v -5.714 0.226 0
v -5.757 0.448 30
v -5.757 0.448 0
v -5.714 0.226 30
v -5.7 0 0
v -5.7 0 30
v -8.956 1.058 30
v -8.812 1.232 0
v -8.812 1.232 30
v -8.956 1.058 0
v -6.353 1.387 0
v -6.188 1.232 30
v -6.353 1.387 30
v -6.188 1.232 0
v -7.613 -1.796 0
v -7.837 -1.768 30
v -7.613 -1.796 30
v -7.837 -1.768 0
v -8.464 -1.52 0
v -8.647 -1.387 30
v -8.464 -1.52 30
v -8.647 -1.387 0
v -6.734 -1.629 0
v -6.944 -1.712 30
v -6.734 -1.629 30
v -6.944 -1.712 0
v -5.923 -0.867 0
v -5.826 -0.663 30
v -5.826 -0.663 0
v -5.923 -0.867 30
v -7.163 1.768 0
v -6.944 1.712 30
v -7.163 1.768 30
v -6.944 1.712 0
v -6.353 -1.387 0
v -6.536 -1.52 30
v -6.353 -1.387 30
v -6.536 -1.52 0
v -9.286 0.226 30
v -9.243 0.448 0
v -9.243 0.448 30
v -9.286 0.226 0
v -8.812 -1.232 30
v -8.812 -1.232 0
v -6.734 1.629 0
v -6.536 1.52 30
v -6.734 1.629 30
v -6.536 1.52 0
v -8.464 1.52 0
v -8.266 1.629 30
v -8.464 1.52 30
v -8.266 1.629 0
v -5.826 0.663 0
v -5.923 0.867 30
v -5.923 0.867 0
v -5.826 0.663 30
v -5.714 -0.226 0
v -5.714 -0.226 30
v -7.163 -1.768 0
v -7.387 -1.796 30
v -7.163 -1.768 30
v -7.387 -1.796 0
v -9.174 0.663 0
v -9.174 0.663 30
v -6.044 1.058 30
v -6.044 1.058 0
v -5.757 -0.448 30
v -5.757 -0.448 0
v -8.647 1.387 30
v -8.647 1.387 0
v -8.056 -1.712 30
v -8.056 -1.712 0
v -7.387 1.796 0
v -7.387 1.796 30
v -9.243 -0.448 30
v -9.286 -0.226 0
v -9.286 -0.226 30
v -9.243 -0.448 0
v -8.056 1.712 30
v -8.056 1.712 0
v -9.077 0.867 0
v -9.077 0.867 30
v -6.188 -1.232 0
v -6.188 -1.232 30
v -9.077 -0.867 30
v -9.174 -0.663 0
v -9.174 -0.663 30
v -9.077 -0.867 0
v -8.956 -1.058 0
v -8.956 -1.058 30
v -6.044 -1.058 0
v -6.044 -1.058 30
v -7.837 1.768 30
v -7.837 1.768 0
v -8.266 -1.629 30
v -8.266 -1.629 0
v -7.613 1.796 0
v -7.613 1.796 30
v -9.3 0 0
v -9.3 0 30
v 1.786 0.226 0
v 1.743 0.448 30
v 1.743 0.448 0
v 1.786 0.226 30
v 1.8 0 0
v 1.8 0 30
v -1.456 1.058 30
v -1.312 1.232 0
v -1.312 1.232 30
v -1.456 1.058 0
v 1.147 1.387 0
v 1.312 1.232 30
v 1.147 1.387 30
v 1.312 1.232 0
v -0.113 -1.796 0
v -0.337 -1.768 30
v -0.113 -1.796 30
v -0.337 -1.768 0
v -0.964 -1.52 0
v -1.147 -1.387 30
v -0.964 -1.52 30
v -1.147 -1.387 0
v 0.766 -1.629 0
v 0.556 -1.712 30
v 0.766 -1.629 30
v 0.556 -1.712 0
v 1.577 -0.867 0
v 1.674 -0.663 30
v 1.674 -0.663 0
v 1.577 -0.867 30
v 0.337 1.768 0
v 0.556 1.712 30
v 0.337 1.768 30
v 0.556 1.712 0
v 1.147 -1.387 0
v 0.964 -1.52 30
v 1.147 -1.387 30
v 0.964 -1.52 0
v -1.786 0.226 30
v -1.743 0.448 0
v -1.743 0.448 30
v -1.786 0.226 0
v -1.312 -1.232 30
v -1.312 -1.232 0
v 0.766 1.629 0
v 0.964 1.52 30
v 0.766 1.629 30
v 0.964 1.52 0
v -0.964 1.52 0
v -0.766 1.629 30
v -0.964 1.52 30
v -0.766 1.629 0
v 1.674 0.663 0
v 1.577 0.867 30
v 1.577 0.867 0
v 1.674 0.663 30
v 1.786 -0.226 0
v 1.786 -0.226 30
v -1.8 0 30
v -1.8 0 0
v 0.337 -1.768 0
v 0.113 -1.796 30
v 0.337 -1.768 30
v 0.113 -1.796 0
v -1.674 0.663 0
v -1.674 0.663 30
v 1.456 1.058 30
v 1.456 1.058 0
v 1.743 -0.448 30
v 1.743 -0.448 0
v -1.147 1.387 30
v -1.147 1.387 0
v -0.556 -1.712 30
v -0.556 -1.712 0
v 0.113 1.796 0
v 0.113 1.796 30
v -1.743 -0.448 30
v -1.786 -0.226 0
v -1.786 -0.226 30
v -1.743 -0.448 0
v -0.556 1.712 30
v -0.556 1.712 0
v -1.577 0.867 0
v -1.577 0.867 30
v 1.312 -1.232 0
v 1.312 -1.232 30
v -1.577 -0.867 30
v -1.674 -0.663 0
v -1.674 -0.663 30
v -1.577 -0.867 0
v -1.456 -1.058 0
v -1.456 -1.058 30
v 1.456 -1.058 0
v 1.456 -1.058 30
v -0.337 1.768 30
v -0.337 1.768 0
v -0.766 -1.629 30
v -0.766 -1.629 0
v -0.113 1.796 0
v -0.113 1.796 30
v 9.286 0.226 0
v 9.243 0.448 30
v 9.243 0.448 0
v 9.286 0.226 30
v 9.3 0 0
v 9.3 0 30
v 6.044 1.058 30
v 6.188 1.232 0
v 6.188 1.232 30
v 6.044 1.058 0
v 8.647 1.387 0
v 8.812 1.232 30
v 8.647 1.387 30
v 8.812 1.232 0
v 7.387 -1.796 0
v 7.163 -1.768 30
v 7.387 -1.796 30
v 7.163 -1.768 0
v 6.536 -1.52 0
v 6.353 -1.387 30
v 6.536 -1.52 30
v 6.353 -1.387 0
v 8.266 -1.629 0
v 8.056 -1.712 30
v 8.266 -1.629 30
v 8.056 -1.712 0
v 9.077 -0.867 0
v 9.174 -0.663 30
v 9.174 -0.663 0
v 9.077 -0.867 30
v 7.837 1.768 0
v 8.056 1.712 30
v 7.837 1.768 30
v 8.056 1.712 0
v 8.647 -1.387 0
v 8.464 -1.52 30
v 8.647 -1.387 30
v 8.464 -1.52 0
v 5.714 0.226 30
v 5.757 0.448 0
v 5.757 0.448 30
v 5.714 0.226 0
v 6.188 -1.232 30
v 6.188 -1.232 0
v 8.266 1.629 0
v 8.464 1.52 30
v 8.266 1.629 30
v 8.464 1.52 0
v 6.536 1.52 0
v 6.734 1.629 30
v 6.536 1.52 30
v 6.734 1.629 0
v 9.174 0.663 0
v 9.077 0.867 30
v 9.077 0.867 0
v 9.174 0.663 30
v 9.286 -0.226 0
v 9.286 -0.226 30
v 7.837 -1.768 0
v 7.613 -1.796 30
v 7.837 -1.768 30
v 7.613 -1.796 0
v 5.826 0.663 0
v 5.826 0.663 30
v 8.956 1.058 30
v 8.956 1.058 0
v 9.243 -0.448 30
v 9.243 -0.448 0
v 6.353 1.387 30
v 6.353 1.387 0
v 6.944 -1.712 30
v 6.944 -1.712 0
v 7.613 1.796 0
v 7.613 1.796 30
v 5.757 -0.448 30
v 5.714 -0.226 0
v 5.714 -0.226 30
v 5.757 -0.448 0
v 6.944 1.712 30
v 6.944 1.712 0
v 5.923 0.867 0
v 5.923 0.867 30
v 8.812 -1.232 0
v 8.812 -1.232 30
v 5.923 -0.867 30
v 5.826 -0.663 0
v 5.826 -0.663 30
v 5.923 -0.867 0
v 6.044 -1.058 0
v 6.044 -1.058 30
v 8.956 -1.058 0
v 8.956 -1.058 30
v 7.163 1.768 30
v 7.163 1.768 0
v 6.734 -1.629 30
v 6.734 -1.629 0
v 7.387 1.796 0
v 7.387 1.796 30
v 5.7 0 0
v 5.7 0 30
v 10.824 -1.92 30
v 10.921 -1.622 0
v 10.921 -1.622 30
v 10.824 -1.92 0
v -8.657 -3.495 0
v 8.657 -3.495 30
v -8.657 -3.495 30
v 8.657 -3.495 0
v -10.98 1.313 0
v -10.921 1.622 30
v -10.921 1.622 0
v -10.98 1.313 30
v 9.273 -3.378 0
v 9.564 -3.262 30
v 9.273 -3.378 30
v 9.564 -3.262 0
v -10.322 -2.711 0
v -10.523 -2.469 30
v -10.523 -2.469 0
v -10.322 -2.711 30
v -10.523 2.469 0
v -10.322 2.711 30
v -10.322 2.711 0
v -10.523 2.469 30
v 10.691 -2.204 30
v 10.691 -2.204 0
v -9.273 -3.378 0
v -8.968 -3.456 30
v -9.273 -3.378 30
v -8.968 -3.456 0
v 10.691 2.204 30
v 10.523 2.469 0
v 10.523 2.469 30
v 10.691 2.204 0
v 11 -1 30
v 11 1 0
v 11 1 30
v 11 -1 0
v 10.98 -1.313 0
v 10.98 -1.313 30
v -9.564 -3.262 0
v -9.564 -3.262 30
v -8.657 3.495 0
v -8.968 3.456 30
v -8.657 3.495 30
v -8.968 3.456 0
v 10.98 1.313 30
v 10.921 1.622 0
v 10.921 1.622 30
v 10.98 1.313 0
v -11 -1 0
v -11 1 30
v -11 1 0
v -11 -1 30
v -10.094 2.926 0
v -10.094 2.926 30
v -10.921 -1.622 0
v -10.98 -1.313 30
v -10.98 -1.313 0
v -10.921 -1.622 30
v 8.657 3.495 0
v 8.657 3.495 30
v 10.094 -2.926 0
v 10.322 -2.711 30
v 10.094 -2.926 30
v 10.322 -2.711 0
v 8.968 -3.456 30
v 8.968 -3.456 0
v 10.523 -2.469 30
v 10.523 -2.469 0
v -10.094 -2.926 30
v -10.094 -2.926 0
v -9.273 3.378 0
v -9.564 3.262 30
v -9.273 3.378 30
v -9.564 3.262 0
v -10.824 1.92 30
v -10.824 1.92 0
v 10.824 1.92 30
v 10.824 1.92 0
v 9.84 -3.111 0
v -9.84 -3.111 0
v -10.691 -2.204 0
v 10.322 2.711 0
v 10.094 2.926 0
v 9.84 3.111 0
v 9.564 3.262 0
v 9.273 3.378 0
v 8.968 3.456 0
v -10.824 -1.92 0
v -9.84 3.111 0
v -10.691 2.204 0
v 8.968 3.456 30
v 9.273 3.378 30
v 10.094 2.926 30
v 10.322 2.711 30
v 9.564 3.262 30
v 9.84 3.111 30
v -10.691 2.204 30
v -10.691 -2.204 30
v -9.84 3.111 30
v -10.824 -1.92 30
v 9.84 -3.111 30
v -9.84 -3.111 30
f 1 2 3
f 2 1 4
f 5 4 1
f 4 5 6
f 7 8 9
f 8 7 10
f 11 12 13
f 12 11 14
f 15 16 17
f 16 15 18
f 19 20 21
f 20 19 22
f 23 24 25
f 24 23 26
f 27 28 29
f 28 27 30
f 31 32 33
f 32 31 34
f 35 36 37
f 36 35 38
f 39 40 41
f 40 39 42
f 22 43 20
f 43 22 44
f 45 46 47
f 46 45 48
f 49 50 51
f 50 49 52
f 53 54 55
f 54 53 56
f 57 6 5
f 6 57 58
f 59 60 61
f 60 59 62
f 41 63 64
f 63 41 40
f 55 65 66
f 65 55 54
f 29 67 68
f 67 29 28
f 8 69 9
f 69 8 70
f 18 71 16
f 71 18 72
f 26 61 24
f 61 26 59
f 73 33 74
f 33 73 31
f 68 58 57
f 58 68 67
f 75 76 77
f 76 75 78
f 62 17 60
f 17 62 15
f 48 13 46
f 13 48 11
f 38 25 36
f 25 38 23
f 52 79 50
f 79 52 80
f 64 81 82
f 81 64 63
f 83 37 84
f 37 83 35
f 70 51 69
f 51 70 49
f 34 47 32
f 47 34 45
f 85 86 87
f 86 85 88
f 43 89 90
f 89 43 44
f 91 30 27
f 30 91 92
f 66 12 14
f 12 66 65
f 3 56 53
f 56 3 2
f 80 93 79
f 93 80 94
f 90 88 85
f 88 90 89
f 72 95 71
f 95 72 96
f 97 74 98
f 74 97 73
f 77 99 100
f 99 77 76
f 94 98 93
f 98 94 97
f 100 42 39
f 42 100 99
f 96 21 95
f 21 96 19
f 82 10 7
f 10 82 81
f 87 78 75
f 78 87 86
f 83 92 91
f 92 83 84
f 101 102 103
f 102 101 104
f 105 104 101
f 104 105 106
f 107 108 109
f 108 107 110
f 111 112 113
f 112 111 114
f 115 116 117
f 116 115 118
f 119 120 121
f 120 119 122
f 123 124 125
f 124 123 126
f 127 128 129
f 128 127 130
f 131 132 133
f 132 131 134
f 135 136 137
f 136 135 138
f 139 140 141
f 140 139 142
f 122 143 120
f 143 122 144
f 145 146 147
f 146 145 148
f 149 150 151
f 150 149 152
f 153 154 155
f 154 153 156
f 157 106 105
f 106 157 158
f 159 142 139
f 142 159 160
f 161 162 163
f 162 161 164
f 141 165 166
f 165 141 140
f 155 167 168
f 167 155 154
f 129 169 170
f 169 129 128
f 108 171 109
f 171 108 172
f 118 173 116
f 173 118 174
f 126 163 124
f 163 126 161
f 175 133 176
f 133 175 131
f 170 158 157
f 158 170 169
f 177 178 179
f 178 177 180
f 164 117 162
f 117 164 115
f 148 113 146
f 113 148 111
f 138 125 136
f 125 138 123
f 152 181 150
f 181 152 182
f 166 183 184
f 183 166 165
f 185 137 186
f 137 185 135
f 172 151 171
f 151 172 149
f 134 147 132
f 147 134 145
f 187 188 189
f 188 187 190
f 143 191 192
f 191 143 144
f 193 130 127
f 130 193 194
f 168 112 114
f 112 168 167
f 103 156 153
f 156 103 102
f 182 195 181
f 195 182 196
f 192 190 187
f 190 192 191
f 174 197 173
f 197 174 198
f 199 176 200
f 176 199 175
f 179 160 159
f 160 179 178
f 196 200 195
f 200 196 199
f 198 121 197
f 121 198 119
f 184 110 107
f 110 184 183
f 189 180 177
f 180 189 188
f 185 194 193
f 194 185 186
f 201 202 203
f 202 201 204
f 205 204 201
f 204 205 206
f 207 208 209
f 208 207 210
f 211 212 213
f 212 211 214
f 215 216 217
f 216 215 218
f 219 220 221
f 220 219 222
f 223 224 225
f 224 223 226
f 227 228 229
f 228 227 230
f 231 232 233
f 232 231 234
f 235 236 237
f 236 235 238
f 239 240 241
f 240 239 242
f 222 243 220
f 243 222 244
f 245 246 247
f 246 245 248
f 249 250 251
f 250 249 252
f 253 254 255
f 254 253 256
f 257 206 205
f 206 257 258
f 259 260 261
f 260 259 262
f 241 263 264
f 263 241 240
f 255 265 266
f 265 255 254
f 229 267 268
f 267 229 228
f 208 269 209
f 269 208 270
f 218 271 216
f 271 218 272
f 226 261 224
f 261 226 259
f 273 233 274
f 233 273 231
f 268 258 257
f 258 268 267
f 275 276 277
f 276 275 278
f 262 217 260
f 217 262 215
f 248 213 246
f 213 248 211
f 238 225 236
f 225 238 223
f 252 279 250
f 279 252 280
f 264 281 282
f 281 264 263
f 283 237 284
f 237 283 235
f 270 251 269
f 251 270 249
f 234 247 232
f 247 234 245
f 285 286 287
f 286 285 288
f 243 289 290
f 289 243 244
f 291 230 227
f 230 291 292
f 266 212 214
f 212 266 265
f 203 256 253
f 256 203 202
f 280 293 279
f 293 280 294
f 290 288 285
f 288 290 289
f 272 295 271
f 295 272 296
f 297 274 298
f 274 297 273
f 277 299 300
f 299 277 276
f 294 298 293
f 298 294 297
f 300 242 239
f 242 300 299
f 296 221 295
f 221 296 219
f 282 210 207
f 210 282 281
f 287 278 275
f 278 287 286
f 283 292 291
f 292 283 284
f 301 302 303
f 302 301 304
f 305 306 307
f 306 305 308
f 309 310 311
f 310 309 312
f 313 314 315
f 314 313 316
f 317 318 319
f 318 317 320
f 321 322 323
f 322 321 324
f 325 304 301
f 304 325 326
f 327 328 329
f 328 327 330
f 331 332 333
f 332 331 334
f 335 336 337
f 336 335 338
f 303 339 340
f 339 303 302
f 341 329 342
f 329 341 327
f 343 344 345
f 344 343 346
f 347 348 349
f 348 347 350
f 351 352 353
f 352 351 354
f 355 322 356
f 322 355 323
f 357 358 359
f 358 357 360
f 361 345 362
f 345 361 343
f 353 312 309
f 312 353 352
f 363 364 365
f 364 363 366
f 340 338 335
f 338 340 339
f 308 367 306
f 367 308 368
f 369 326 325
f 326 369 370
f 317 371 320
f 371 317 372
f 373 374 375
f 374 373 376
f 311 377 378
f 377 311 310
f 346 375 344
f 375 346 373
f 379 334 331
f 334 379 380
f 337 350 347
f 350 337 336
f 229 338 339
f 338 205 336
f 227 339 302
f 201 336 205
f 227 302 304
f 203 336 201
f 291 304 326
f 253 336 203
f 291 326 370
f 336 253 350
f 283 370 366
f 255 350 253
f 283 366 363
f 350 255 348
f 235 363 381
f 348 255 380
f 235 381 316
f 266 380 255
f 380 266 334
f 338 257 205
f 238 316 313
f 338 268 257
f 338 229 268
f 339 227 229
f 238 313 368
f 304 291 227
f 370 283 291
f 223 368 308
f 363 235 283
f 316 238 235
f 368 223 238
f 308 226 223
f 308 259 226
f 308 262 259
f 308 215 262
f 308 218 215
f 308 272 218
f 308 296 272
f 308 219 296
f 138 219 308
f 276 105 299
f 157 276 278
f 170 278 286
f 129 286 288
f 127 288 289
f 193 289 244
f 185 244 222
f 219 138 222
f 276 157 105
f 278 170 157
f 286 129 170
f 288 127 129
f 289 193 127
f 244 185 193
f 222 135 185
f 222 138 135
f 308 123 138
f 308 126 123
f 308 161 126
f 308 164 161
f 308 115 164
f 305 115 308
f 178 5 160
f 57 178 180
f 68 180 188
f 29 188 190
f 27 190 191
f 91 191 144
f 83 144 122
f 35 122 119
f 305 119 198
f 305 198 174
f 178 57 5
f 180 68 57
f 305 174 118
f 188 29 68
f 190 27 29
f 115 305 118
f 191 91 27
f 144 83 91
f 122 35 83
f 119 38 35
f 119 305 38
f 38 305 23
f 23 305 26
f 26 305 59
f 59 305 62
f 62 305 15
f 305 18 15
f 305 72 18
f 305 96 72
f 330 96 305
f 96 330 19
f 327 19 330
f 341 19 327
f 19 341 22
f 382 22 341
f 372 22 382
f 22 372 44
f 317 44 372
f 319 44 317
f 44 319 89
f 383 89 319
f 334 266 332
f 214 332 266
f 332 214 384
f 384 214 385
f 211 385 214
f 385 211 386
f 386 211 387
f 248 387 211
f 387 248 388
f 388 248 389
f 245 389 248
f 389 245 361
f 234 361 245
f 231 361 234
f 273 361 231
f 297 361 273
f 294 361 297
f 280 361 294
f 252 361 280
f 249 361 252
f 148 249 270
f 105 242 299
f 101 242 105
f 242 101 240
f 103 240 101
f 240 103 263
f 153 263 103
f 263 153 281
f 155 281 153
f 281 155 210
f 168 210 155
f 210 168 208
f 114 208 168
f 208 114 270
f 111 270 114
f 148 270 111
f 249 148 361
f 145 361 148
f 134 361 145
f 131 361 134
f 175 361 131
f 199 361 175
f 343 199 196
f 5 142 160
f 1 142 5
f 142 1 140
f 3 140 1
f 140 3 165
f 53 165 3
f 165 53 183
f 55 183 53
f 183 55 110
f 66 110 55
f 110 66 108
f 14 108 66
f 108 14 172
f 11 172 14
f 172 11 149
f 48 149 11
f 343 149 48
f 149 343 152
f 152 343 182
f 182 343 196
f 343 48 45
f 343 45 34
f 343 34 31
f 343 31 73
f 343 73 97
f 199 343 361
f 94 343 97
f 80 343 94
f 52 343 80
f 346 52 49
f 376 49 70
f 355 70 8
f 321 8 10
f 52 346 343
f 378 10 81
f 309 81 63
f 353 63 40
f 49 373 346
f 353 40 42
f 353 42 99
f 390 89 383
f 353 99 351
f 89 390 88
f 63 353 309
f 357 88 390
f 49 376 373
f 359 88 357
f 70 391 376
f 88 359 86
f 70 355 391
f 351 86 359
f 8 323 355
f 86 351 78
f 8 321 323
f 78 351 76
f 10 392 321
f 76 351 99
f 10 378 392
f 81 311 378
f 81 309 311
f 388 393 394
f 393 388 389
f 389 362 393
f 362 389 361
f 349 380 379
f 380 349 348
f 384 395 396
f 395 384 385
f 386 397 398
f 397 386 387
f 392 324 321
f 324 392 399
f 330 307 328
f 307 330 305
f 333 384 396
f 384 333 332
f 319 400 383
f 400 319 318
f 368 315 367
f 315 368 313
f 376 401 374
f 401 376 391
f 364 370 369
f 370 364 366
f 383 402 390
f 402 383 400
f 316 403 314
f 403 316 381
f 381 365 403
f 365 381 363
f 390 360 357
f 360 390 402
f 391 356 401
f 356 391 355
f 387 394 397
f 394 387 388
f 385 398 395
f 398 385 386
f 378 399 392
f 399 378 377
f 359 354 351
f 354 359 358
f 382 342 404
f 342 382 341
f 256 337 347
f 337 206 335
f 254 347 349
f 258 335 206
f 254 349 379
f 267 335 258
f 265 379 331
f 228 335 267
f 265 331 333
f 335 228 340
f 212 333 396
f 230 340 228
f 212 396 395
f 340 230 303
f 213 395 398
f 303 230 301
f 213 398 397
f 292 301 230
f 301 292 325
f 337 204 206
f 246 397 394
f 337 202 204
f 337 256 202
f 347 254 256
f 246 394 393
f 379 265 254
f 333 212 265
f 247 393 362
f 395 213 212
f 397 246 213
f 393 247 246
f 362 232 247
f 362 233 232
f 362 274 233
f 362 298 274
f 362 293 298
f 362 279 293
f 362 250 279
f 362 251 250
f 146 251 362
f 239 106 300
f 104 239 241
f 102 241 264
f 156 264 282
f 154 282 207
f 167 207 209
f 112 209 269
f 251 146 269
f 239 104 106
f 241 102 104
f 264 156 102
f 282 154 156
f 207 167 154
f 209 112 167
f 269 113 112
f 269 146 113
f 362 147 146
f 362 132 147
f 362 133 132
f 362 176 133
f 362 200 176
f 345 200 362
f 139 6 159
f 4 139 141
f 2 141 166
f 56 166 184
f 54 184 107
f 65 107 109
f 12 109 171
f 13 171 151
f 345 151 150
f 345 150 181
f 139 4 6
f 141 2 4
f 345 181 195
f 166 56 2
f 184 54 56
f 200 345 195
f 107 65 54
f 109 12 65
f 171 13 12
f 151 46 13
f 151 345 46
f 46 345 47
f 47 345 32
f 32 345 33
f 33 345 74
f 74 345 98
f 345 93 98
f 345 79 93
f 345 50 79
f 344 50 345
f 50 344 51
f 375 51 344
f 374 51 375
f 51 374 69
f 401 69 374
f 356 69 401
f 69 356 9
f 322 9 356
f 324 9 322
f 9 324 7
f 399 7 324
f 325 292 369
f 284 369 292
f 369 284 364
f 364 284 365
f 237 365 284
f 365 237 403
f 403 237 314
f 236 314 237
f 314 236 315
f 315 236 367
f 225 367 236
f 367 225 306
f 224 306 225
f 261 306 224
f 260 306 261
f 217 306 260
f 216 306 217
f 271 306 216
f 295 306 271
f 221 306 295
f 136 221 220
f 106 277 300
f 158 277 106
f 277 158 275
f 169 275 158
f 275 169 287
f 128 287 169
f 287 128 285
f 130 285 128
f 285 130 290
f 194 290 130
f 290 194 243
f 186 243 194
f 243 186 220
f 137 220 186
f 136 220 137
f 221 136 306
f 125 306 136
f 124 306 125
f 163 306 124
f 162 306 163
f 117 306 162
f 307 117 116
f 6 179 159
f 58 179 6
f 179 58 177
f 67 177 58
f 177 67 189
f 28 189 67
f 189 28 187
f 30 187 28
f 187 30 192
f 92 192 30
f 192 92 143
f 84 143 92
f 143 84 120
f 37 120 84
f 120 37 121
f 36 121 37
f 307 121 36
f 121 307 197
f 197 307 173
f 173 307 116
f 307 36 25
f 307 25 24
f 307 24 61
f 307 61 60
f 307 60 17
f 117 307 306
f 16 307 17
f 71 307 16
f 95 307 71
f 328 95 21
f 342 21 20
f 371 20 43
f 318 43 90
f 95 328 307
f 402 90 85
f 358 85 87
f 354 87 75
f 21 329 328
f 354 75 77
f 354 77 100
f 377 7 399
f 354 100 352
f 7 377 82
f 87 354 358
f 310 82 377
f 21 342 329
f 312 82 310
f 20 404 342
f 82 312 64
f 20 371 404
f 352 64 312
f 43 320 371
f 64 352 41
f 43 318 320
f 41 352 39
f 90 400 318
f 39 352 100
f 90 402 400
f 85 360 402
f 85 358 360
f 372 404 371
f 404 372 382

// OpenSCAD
$fn = 50;


difference() {
	union() {
		translate(v = [0, 0, 0]) {
			rotate(a = [0, 0, 0]) {
				hull() {
					translate(v = [-8.5000000000, 1.0000000000, 0]) {
						rotate(a = [0, 0, 0]) {
							translate(v = [0, 0, 0]) {
								rotate(a = [0, 0, 0]) {
									cylinder(h = 30, r = 2.5000000000);
								}
							}
						}
					}
					translate(v = [8.5000000000, 1.0000000000, 0]) {
						rotate(a = [0, 0, 0]) {
							translate(v = [0, 0, 0]) {
								rotate(a = [0, 0, 0]) {
									cylinder(h = 30, r = 2.5000000000);
								}
							}
						}
					}
					translate(v = [-8.5000000000, -1.0000000000, 0]) {
						rotate(a = [0, 0, 0]) {
							translate(v = [0, 0, 0]) {
								rotate(a = [0, 0, 0]) {
									cylinder(h = 30, r = 2.5000000000);
								}
							}
						}
					}
					translate(v = [8.5000000000, -1.0000000000, 0]) {
						rotate(a = [0, 0, 0]) {
							translate(v = [0, 0, 0]) {
								rotate(a = [0, 0, 0]) {
									cylinder(h = 30, r = 2.5000000000);
								}
							}
						}
					}
				}
			}
		}
	}
	union() {
		translate(v = [-7.5000000000, 0.0000000000, 0]) {
			rotate(a = [0, 0, 0]) {
				translate(v = [0, 0, -50]) {
					rotate(a = [0, 0, 0]) {
						cylinder(h = 100, r = 1.8000000000);
					}
				}
			}
		}
		translate(v = [0.0000000000, 0.0000000000, 0]) {
			rotate(a = [0, 0, 0]) {
				translate(v = [0, 0, -50]) {
					rotate(a = [0, 0, 0]) {
						cylinder(h = 100, r = 1.8000000000);
					}
				}
			}
		}
		translate(v = [7.5000000000, 0.0000000000, 0]) {
			rotate(a = [0, 0, 0]) {
				translate(v = [0, 0, -50]) {
					rotate(a = [0, 0, 0]) {
						cylinder(h = 100, r = 1.8000000000);
					}
				}
			}
		}
	}
}
